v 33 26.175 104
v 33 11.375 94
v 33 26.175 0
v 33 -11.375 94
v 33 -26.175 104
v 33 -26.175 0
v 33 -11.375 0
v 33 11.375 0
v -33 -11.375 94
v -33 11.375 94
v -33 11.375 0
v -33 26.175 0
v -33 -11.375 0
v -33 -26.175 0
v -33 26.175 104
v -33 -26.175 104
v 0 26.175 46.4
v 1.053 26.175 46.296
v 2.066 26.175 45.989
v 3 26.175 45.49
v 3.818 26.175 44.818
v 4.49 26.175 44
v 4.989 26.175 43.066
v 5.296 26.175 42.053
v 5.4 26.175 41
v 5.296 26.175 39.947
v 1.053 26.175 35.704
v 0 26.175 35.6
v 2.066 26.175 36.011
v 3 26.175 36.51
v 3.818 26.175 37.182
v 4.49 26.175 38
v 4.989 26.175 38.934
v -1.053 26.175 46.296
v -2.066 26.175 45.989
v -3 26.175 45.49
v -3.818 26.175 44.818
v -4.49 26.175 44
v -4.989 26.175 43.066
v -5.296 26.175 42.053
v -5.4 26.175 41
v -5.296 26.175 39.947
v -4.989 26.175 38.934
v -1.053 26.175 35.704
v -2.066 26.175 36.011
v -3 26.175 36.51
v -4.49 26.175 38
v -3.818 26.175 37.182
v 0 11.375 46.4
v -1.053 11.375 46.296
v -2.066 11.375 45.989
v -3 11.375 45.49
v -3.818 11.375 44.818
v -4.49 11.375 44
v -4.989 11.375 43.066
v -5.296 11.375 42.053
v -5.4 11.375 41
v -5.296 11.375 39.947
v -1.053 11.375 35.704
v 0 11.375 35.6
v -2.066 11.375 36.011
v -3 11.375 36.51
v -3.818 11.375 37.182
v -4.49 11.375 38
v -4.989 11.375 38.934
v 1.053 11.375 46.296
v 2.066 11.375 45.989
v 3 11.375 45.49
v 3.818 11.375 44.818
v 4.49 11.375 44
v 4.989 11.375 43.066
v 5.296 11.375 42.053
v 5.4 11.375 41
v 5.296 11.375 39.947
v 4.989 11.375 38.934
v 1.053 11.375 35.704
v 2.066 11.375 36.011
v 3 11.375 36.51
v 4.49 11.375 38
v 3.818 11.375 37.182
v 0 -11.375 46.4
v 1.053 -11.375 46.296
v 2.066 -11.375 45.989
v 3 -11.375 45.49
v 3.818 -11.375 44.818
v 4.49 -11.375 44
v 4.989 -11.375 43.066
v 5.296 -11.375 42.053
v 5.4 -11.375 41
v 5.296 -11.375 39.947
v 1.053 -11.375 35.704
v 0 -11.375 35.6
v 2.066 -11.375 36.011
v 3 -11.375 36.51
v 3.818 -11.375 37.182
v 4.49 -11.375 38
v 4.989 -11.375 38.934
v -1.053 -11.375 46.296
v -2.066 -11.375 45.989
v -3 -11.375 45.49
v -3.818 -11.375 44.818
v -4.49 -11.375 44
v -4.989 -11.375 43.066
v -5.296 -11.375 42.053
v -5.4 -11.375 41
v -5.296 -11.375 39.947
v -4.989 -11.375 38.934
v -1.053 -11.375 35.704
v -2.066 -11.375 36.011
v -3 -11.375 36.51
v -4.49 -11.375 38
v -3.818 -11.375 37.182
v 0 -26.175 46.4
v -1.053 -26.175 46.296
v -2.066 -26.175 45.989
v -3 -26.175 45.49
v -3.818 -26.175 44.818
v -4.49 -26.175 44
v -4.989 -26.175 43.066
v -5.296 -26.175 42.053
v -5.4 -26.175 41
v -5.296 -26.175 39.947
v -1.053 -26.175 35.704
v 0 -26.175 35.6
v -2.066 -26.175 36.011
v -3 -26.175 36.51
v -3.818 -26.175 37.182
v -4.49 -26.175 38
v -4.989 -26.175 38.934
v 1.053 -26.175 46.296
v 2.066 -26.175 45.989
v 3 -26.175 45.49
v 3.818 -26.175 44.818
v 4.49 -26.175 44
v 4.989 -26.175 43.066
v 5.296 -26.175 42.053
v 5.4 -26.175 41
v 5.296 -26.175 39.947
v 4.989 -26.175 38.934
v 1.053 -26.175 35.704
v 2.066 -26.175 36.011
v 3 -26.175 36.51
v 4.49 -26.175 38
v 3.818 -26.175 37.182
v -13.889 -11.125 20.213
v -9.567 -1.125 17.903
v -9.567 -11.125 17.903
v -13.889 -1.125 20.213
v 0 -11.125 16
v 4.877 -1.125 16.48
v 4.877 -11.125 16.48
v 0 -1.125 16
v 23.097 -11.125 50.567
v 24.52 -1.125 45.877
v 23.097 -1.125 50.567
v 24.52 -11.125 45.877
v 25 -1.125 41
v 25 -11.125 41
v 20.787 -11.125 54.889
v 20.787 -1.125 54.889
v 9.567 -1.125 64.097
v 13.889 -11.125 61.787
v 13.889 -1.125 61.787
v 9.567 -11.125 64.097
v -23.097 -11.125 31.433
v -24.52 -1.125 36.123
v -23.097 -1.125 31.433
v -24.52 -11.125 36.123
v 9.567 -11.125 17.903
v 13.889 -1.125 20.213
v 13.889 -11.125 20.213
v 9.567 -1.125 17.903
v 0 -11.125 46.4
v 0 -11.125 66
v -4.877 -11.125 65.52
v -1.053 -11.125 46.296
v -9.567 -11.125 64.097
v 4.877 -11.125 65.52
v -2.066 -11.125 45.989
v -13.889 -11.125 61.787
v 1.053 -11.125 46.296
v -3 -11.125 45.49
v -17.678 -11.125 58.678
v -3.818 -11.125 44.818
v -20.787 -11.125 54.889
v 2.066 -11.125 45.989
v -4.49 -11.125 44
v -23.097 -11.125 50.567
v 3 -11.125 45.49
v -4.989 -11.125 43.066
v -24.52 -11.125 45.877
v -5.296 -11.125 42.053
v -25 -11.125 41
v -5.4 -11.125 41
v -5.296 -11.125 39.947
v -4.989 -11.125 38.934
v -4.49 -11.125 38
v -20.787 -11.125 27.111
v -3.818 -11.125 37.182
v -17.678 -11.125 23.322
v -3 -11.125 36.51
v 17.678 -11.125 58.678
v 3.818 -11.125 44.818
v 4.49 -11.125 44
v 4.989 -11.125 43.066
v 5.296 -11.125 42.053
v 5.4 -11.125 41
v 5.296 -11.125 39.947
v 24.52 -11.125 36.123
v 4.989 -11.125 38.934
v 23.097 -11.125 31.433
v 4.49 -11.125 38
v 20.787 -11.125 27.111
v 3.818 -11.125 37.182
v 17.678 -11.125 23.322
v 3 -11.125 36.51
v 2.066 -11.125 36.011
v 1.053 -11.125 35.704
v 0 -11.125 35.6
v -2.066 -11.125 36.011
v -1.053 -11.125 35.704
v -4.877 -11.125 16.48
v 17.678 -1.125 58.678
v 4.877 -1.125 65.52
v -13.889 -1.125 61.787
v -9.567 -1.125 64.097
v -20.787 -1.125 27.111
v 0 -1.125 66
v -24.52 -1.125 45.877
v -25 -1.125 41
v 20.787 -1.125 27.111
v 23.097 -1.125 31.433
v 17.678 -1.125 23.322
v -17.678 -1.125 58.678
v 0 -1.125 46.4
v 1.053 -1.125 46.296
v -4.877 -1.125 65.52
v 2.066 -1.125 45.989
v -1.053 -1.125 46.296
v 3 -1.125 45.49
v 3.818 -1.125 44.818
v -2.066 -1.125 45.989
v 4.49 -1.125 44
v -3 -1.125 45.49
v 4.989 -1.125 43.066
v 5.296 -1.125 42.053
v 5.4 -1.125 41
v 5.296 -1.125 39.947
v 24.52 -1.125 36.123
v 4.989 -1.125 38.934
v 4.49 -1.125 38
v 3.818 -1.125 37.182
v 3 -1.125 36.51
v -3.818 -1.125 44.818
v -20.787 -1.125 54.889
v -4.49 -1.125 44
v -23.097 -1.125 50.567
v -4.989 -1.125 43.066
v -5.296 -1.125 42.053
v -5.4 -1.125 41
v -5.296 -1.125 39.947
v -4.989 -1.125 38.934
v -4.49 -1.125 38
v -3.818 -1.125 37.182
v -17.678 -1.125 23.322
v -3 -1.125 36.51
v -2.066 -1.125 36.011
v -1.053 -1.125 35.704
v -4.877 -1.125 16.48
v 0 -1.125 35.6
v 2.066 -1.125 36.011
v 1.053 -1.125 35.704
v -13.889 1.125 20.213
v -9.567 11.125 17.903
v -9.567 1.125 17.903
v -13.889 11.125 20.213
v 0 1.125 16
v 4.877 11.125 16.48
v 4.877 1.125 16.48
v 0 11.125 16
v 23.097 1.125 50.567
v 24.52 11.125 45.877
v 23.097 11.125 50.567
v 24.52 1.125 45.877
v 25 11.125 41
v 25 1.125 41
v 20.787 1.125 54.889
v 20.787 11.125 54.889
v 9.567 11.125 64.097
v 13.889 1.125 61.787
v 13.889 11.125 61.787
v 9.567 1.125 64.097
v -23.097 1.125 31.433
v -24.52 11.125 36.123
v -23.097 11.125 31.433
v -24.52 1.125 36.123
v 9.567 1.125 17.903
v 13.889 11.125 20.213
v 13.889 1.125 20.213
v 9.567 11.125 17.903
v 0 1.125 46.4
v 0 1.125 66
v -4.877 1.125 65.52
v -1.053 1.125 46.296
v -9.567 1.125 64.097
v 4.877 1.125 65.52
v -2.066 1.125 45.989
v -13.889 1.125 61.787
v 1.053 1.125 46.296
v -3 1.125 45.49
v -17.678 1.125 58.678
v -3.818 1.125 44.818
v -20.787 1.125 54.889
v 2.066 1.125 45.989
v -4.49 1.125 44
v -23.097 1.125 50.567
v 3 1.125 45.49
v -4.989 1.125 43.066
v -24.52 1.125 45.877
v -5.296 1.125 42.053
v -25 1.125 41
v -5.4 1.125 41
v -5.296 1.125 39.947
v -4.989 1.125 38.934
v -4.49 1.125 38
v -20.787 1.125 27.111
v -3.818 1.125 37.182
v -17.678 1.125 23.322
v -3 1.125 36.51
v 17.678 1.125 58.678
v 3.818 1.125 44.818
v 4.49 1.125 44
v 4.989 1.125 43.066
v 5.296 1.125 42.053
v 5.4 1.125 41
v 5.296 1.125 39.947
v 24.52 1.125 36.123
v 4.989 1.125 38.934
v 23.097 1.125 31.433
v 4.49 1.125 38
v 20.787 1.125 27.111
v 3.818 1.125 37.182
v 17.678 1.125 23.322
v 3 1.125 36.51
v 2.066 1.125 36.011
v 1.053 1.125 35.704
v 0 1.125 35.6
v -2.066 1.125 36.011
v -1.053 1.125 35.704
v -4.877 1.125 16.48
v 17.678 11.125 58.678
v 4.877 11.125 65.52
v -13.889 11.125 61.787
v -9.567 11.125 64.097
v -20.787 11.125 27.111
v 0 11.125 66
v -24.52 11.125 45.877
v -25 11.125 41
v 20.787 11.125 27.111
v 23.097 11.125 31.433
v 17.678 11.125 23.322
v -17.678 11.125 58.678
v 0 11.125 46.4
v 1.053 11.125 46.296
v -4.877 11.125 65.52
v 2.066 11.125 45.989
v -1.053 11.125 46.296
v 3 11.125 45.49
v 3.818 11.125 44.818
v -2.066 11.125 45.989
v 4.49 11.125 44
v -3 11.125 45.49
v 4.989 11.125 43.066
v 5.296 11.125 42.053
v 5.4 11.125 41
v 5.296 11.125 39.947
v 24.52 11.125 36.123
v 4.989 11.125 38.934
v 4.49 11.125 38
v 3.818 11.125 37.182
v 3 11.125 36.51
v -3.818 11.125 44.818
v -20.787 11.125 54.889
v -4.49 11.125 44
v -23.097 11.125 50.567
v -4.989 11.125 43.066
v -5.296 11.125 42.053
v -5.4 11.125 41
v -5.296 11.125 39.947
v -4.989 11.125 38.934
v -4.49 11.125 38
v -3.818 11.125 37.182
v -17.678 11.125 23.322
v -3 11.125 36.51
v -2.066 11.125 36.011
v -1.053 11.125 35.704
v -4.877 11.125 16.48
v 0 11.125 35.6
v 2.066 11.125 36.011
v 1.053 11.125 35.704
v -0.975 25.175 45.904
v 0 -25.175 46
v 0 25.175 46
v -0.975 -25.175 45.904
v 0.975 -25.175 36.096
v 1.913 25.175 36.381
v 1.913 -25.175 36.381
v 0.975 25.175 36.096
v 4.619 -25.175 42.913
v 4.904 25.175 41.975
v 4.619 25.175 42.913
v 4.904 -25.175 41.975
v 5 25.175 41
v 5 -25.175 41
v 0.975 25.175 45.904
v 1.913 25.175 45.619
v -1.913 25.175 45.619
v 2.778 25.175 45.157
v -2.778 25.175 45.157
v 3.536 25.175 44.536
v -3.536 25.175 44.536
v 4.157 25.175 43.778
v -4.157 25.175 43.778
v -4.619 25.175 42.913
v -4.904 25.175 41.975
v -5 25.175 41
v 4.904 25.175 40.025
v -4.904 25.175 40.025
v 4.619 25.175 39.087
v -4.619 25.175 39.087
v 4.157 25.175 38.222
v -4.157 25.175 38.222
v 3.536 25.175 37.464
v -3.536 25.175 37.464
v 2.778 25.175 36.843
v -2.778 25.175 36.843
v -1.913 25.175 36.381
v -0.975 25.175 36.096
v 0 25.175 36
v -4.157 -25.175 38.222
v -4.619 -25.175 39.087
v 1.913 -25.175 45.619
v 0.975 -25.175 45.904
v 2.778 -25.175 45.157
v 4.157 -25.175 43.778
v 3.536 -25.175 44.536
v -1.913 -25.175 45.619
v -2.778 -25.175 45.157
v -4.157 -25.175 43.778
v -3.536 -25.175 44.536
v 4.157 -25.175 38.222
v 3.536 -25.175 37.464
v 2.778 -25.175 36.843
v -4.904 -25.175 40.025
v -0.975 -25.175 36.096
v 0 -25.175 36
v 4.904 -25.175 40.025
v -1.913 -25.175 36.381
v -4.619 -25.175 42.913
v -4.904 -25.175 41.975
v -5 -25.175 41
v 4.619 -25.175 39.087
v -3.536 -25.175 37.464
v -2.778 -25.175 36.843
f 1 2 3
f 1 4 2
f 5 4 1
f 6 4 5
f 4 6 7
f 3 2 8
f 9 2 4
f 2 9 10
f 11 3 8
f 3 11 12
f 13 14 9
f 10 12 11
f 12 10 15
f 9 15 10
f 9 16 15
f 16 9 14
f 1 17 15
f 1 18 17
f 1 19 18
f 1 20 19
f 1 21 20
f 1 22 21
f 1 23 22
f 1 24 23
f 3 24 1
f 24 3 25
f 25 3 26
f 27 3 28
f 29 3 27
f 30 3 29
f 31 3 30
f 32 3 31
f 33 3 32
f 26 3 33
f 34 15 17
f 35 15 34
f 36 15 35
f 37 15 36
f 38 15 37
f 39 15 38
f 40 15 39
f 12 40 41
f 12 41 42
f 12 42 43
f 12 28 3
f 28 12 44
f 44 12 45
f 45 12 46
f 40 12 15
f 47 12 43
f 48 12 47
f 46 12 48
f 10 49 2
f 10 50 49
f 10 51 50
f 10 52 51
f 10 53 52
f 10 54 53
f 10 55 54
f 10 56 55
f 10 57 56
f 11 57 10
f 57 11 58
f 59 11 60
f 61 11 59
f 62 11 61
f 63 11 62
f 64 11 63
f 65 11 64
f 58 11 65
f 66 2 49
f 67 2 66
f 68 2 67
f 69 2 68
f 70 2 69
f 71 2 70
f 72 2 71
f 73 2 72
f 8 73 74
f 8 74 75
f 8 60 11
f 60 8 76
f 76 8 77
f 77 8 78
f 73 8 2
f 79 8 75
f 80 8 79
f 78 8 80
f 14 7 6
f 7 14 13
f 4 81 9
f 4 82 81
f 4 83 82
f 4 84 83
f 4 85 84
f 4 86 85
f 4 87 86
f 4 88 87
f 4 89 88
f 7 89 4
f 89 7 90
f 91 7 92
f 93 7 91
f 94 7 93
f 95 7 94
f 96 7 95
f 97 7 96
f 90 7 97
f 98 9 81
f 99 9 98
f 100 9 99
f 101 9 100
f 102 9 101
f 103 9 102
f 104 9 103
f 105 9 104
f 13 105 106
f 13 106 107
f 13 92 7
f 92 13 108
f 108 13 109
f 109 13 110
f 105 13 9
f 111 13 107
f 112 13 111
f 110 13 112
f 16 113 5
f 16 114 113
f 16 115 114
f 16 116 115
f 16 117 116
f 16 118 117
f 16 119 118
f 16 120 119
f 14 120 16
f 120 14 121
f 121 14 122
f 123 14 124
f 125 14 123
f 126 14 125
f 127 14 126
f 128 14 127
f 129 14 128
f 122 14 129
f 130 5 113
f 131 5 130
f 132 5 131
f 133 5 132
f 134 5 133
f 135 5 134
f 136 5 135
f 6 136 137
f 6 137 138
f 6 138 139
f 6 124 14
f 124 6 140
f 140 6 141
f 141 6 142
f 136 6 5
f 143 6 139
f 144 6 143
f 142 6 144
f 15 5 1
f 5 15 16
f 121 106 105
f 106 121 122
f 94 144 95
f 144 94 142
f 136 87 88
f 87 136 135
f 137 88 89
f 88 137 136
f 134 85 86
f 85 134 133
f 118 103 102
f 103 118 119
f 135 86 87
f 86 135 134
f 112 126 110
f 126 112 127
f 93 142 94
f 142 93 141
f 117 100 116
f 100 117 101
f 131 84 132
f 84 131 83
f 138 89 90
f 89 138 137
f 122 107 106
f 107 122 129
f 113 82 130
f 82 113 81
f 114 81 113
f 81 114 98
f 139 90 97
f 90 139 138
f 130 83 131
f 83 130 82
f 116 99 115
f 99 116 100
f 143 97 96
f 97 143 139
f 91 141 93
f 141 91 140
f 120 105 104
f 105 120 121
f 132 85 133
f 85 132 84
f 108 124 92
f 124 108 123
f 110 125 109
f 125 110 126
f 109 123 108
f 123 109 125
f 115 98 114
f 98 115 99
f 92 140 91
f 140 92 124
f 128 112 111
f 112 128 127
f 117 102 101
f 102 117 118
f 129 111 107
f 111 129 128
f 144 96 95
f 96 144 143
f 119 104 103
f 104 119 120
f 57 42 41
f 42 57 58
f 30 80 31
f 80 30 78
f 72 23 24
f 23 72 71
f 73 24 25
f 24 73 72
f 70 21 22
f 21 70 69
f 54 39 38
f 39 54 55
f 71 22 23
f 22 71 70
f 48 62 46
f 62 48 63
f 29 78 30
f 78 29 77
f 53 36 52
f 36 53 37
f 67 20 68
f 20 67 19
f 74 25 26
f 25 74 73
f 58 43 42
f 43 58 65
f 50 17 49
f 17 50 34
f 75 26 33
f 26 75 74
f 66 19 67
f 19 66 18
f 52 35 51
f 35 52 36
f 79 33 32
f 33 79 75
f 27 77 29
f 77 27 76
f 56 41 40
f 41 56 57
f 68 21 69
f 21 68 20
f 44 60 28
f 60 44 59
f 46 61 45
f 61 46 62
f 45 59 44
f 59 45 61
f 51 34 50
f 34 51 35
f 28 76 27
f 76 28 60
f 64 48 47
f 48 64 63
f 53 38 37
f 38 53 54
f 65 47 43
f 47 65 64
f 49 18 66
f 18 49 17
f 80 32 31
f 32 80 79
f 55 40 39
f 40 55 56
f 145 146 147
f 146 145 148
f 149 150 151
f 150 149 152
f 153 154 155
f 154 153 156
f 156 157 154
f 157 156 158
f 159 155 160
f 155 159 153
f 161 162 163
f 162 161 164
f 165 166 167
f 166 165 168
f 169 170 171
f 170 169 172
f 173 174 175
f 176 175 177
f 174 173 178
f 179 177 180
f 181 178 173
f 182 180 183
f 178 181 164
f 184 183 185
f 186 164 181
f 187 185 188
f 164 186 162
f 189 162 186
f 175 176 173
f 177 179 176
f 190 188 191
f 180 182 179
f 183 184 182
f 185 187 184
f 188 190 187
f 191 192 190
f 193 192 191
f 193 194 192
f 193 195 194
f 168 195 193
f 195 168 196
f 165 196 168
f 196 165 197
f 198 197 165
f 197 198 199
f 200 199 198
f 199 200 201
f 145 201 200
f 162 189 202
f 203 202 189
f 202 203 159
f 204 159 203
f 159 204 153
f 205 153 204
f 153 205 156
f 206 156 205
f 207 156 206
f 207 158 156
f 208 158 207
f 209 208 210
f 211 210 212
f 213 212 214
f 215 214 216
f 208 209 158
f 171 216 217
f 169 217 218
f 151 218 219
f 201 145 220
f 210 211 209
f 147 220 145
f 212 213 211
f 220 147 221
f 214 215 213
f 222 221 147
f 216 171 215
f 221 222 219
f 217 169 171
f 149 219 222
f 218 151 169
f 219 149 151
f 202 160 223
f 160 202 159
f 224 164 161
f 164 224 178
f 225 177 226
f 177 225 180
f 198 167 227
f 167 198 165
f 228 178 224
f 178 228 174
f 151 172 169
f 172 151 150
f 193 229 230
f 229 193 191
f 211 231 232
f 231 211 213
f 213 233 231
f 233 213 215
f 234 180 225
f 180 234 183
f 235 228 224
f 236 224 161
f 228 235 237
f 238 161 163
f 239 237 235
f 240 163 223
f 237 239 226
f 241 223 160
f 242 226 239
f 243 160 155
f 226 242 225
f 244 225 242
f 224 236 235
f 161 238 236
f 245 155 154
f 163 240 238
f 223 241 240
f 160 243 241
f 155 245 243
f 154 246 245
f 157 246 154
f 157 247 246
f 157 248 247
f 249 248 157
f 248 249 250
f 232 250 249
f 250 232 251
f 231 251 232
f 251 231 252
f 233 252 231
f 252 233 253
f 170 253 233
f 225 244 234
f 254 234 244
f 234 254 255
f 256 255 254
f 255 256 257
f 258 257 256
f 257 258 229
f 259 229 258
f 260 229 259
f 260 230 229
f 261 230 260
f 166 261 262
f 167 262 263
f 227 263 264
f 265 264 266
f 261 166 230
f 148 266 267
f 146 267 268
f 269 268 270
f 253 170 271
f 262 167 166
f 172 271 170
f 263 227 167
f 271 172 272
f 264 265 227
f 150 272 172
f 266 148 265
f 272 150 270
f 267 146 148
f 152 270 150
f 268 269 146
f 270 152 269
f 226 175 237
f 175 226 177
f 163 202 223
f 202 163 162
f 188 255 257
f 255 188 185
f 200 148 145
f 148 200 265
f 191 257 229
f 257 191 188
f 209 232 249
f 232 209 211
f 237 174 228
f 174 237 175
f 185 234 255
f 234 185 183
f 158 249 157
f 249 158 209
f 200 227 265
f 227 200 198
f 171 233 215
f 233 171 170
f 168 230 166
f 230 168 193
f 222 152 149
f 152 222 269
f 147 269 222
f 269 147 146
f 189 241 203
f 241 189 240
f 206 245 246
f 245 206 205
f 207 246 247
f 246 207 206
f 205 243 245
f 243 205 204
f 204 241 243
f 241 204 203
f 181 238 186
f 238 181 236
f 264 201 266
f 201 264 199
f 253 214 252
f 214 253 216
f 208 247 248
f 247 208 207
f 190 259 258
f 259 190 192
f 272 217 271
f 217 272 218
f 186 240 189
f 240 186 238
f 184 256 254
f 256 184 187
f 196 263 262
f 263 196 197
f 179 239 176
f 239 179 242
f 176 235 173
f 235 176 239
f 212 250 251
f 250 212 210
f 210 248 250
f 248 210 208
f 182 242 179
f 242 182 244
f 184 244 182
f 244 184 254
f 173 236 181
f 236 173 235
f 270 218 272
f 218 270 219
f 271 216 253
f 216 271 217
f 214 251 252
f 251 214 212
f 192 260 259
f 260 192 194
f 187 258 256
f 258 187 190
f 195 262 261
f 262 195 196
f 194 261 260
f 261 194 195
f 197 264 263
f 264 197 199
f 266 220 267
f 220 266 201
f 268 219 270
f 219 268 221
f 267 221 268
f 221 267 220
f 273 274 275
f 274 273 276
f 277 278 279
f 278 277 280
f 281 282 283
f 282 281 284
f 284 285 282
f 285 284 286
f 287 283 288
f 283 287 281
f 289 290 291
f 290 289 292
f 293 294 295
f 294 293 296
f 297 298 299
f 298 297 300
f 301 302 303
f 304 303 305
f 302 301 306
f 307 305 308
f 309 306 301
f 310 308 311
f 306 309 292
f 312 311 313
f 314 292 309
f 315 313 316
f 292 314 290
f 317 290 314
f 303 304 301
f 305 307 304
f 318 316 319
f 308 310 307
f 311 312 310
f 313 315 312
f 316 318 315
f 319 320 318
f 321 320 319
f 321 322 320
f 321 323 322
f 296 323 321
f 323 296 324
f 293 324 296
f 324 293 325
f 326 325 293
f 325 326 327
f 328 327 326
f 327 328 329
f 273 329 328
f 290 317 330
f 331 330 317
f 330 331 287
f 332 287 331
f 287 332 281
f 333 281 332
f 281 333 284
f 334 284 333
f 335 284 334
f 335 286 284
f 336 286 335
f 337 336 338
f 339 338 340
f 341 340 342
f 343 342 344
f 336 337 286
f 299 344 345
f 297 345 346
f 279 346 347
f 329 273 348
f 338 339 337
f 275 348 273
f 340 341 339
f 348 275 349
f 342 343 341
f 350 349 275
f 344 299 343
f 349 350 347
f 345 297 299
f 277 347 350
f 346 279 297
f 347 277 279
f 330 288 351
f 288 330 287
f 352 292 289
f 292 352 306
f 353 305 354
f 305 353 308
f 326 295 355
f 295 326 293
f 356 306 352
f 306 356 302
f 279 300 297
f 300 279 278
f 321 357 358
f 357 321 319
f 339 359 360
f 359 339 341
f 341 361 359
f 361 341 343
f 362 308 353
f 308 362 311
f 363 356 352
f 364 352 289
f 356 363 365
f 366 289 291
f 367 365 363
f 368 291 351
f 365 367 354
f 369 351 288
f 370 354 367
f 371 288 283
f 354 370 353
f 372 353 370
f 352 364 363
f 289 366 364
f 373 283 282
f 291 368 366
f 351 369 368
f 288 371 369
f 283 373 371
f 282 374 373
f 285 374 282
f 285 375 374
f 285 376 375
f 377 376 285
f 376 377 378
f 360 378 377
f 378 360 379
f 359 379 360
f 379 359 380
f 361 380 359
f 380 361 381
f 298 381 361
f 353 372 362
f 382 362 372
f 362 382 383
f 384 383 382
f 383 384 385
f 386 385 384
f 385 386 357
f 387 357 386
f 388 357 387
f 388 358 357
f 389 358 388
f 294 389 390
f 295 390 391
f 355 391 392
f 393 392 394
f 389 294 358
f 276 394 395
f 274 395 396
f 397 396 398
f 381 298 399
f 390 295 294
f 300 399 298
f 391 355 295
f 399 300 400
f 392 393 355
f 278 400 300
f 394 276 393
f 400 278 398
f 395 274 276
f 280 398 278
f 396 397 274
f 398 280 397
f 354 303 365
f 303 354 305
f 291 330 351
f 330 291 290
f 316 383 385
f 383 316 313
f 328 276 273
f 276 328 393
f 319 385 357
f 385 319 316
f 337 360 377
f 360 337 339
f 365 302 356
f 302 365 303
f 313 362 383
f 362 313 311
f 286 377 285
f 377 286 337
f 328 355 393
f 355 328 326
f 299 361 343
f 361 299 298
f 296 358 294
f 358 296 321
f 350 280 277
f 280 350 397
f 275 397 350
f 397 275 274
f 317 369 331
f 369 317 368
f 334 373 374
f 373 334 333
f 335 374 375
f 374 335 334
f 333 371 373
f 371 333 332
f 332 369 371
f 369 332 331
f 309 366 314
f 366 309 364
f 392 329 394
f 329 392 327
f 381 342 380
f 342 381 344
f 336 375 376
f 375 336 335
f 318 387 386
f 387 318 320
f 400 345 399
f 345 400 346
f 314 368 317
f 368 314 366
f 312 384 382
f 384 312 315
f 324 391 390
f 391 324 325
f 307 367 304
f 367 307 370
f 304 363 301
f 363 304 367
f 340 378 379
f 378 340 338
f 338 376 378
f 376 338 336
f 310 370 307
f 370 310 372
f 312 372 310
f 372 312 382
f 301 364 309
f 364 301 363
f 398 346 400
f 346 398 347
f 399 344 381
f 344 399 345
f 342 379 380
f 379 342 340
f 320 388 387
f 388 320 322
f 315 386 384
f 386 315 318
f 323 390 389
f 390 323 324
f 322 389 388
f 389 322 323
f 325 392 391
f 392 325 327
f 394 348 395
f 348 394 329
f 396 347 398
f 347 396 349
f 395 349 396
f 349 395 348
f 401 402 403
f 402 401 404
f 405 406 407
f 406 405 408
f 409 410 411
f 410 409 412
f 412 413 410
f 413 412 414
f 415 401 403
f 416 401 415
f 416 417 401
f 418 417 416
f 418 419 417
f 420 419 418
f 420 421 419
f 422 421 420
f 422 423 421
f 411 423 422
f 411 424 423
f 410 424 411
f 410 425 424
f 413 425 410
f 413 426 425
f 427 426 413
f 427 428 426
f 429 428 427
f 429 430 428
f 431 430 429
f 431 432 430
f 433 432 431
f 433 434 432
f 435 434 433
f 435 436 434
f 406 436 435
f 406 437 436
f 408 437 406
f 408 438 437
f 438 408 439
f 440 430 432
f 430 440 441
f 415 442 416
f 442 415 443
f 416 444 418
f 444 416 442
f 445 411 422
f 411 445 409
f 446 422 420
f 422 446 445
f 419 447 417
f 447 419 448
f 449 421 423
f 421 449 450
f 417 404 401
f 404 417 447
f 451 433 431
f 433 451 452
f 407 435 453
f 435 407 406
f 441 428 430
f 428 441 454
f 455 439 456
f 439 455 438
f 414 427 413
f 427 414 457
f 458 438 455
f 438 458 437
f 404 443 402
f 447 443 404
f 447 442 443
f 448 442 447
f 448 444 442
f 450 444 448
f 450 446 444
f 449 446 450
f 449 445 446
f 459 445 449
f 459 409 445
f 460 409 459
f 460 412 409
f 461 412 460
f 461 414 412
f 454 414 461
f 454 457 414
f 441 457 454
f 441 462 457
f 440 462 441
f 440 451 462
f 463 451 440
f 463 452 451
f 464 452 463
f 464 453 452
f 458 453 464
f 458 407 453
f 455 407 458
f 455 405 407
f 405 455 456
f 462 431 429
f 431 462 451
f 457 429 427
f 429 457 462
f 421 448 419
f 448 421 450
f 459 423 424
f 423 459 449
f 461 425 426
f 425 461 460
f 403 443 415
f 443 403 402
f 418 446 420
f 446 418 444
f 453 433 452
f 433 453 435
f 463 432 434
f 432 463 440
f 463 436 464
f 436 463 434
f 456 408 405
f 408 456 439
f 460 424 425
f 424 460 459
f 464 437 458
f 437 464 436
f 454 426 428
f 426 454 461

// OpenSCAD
$fn = 32;

// ------------------------------------------------------------------------
// Trolley wheel set: wheels d50, fork 94 mm tall
// Every part is its own module, assembly() places every instance.
// ------------------------------------------------------------------------

// --- part 1 ---
module trolley_fork() {
  difference() {
    union() {
      translate([-33, 11.375, 0]) cube([66, 14.8, 94]);
      translate([-33, -26.175, 0]) cube([66, 14.8, 94]);
      translate([-33, -26.175, 94]) cube([66, 52.35, 10]);
    }
    translate([0, -18.775, 41]) rotate([90, 0, 0]) cylinder(h = 16.8, d = 10.8, center = true);
    translate([0, 18.775, 41]) rotate([90, 0, 0]) cylinder(h = 16.8, d = 10.8, center = true);
  }
}

// --- part 2 ---
module trolley_wheel() {
  difference() {
      translate([0, 0, 0]) cylinder(h = 10, d = 50);
      translate([0, 0, -1]) cylinder(h = 12, d = 10.8);
    }
}

// --- part 3 ---
module trolley_axle() {
  translate([0, 0, -25.175]) cylinder(h = 50.35, d = 10);
}

// --- assembly ---
module assembly() {
  color([0.80, 0.24, 0.20]) translate([0, 0, 0]) rotate([0, 0, 0]) trolley_fork();
  color([0.20, 0.45, 0.75]) translate([0, -1.125, 41]) rotate([90, 0, 0]) trolley_wheel();
  color([0.25, 0.62, 0.32]) translate([0, 11.125, 41]) rotate([90, 0, 0]) trolley_wheel();
  color([0.92, 0.70, 0.18]) translate([0, 0, 41]) rotate([90, 0, 0]) trolley_axle();
}

assembly();
